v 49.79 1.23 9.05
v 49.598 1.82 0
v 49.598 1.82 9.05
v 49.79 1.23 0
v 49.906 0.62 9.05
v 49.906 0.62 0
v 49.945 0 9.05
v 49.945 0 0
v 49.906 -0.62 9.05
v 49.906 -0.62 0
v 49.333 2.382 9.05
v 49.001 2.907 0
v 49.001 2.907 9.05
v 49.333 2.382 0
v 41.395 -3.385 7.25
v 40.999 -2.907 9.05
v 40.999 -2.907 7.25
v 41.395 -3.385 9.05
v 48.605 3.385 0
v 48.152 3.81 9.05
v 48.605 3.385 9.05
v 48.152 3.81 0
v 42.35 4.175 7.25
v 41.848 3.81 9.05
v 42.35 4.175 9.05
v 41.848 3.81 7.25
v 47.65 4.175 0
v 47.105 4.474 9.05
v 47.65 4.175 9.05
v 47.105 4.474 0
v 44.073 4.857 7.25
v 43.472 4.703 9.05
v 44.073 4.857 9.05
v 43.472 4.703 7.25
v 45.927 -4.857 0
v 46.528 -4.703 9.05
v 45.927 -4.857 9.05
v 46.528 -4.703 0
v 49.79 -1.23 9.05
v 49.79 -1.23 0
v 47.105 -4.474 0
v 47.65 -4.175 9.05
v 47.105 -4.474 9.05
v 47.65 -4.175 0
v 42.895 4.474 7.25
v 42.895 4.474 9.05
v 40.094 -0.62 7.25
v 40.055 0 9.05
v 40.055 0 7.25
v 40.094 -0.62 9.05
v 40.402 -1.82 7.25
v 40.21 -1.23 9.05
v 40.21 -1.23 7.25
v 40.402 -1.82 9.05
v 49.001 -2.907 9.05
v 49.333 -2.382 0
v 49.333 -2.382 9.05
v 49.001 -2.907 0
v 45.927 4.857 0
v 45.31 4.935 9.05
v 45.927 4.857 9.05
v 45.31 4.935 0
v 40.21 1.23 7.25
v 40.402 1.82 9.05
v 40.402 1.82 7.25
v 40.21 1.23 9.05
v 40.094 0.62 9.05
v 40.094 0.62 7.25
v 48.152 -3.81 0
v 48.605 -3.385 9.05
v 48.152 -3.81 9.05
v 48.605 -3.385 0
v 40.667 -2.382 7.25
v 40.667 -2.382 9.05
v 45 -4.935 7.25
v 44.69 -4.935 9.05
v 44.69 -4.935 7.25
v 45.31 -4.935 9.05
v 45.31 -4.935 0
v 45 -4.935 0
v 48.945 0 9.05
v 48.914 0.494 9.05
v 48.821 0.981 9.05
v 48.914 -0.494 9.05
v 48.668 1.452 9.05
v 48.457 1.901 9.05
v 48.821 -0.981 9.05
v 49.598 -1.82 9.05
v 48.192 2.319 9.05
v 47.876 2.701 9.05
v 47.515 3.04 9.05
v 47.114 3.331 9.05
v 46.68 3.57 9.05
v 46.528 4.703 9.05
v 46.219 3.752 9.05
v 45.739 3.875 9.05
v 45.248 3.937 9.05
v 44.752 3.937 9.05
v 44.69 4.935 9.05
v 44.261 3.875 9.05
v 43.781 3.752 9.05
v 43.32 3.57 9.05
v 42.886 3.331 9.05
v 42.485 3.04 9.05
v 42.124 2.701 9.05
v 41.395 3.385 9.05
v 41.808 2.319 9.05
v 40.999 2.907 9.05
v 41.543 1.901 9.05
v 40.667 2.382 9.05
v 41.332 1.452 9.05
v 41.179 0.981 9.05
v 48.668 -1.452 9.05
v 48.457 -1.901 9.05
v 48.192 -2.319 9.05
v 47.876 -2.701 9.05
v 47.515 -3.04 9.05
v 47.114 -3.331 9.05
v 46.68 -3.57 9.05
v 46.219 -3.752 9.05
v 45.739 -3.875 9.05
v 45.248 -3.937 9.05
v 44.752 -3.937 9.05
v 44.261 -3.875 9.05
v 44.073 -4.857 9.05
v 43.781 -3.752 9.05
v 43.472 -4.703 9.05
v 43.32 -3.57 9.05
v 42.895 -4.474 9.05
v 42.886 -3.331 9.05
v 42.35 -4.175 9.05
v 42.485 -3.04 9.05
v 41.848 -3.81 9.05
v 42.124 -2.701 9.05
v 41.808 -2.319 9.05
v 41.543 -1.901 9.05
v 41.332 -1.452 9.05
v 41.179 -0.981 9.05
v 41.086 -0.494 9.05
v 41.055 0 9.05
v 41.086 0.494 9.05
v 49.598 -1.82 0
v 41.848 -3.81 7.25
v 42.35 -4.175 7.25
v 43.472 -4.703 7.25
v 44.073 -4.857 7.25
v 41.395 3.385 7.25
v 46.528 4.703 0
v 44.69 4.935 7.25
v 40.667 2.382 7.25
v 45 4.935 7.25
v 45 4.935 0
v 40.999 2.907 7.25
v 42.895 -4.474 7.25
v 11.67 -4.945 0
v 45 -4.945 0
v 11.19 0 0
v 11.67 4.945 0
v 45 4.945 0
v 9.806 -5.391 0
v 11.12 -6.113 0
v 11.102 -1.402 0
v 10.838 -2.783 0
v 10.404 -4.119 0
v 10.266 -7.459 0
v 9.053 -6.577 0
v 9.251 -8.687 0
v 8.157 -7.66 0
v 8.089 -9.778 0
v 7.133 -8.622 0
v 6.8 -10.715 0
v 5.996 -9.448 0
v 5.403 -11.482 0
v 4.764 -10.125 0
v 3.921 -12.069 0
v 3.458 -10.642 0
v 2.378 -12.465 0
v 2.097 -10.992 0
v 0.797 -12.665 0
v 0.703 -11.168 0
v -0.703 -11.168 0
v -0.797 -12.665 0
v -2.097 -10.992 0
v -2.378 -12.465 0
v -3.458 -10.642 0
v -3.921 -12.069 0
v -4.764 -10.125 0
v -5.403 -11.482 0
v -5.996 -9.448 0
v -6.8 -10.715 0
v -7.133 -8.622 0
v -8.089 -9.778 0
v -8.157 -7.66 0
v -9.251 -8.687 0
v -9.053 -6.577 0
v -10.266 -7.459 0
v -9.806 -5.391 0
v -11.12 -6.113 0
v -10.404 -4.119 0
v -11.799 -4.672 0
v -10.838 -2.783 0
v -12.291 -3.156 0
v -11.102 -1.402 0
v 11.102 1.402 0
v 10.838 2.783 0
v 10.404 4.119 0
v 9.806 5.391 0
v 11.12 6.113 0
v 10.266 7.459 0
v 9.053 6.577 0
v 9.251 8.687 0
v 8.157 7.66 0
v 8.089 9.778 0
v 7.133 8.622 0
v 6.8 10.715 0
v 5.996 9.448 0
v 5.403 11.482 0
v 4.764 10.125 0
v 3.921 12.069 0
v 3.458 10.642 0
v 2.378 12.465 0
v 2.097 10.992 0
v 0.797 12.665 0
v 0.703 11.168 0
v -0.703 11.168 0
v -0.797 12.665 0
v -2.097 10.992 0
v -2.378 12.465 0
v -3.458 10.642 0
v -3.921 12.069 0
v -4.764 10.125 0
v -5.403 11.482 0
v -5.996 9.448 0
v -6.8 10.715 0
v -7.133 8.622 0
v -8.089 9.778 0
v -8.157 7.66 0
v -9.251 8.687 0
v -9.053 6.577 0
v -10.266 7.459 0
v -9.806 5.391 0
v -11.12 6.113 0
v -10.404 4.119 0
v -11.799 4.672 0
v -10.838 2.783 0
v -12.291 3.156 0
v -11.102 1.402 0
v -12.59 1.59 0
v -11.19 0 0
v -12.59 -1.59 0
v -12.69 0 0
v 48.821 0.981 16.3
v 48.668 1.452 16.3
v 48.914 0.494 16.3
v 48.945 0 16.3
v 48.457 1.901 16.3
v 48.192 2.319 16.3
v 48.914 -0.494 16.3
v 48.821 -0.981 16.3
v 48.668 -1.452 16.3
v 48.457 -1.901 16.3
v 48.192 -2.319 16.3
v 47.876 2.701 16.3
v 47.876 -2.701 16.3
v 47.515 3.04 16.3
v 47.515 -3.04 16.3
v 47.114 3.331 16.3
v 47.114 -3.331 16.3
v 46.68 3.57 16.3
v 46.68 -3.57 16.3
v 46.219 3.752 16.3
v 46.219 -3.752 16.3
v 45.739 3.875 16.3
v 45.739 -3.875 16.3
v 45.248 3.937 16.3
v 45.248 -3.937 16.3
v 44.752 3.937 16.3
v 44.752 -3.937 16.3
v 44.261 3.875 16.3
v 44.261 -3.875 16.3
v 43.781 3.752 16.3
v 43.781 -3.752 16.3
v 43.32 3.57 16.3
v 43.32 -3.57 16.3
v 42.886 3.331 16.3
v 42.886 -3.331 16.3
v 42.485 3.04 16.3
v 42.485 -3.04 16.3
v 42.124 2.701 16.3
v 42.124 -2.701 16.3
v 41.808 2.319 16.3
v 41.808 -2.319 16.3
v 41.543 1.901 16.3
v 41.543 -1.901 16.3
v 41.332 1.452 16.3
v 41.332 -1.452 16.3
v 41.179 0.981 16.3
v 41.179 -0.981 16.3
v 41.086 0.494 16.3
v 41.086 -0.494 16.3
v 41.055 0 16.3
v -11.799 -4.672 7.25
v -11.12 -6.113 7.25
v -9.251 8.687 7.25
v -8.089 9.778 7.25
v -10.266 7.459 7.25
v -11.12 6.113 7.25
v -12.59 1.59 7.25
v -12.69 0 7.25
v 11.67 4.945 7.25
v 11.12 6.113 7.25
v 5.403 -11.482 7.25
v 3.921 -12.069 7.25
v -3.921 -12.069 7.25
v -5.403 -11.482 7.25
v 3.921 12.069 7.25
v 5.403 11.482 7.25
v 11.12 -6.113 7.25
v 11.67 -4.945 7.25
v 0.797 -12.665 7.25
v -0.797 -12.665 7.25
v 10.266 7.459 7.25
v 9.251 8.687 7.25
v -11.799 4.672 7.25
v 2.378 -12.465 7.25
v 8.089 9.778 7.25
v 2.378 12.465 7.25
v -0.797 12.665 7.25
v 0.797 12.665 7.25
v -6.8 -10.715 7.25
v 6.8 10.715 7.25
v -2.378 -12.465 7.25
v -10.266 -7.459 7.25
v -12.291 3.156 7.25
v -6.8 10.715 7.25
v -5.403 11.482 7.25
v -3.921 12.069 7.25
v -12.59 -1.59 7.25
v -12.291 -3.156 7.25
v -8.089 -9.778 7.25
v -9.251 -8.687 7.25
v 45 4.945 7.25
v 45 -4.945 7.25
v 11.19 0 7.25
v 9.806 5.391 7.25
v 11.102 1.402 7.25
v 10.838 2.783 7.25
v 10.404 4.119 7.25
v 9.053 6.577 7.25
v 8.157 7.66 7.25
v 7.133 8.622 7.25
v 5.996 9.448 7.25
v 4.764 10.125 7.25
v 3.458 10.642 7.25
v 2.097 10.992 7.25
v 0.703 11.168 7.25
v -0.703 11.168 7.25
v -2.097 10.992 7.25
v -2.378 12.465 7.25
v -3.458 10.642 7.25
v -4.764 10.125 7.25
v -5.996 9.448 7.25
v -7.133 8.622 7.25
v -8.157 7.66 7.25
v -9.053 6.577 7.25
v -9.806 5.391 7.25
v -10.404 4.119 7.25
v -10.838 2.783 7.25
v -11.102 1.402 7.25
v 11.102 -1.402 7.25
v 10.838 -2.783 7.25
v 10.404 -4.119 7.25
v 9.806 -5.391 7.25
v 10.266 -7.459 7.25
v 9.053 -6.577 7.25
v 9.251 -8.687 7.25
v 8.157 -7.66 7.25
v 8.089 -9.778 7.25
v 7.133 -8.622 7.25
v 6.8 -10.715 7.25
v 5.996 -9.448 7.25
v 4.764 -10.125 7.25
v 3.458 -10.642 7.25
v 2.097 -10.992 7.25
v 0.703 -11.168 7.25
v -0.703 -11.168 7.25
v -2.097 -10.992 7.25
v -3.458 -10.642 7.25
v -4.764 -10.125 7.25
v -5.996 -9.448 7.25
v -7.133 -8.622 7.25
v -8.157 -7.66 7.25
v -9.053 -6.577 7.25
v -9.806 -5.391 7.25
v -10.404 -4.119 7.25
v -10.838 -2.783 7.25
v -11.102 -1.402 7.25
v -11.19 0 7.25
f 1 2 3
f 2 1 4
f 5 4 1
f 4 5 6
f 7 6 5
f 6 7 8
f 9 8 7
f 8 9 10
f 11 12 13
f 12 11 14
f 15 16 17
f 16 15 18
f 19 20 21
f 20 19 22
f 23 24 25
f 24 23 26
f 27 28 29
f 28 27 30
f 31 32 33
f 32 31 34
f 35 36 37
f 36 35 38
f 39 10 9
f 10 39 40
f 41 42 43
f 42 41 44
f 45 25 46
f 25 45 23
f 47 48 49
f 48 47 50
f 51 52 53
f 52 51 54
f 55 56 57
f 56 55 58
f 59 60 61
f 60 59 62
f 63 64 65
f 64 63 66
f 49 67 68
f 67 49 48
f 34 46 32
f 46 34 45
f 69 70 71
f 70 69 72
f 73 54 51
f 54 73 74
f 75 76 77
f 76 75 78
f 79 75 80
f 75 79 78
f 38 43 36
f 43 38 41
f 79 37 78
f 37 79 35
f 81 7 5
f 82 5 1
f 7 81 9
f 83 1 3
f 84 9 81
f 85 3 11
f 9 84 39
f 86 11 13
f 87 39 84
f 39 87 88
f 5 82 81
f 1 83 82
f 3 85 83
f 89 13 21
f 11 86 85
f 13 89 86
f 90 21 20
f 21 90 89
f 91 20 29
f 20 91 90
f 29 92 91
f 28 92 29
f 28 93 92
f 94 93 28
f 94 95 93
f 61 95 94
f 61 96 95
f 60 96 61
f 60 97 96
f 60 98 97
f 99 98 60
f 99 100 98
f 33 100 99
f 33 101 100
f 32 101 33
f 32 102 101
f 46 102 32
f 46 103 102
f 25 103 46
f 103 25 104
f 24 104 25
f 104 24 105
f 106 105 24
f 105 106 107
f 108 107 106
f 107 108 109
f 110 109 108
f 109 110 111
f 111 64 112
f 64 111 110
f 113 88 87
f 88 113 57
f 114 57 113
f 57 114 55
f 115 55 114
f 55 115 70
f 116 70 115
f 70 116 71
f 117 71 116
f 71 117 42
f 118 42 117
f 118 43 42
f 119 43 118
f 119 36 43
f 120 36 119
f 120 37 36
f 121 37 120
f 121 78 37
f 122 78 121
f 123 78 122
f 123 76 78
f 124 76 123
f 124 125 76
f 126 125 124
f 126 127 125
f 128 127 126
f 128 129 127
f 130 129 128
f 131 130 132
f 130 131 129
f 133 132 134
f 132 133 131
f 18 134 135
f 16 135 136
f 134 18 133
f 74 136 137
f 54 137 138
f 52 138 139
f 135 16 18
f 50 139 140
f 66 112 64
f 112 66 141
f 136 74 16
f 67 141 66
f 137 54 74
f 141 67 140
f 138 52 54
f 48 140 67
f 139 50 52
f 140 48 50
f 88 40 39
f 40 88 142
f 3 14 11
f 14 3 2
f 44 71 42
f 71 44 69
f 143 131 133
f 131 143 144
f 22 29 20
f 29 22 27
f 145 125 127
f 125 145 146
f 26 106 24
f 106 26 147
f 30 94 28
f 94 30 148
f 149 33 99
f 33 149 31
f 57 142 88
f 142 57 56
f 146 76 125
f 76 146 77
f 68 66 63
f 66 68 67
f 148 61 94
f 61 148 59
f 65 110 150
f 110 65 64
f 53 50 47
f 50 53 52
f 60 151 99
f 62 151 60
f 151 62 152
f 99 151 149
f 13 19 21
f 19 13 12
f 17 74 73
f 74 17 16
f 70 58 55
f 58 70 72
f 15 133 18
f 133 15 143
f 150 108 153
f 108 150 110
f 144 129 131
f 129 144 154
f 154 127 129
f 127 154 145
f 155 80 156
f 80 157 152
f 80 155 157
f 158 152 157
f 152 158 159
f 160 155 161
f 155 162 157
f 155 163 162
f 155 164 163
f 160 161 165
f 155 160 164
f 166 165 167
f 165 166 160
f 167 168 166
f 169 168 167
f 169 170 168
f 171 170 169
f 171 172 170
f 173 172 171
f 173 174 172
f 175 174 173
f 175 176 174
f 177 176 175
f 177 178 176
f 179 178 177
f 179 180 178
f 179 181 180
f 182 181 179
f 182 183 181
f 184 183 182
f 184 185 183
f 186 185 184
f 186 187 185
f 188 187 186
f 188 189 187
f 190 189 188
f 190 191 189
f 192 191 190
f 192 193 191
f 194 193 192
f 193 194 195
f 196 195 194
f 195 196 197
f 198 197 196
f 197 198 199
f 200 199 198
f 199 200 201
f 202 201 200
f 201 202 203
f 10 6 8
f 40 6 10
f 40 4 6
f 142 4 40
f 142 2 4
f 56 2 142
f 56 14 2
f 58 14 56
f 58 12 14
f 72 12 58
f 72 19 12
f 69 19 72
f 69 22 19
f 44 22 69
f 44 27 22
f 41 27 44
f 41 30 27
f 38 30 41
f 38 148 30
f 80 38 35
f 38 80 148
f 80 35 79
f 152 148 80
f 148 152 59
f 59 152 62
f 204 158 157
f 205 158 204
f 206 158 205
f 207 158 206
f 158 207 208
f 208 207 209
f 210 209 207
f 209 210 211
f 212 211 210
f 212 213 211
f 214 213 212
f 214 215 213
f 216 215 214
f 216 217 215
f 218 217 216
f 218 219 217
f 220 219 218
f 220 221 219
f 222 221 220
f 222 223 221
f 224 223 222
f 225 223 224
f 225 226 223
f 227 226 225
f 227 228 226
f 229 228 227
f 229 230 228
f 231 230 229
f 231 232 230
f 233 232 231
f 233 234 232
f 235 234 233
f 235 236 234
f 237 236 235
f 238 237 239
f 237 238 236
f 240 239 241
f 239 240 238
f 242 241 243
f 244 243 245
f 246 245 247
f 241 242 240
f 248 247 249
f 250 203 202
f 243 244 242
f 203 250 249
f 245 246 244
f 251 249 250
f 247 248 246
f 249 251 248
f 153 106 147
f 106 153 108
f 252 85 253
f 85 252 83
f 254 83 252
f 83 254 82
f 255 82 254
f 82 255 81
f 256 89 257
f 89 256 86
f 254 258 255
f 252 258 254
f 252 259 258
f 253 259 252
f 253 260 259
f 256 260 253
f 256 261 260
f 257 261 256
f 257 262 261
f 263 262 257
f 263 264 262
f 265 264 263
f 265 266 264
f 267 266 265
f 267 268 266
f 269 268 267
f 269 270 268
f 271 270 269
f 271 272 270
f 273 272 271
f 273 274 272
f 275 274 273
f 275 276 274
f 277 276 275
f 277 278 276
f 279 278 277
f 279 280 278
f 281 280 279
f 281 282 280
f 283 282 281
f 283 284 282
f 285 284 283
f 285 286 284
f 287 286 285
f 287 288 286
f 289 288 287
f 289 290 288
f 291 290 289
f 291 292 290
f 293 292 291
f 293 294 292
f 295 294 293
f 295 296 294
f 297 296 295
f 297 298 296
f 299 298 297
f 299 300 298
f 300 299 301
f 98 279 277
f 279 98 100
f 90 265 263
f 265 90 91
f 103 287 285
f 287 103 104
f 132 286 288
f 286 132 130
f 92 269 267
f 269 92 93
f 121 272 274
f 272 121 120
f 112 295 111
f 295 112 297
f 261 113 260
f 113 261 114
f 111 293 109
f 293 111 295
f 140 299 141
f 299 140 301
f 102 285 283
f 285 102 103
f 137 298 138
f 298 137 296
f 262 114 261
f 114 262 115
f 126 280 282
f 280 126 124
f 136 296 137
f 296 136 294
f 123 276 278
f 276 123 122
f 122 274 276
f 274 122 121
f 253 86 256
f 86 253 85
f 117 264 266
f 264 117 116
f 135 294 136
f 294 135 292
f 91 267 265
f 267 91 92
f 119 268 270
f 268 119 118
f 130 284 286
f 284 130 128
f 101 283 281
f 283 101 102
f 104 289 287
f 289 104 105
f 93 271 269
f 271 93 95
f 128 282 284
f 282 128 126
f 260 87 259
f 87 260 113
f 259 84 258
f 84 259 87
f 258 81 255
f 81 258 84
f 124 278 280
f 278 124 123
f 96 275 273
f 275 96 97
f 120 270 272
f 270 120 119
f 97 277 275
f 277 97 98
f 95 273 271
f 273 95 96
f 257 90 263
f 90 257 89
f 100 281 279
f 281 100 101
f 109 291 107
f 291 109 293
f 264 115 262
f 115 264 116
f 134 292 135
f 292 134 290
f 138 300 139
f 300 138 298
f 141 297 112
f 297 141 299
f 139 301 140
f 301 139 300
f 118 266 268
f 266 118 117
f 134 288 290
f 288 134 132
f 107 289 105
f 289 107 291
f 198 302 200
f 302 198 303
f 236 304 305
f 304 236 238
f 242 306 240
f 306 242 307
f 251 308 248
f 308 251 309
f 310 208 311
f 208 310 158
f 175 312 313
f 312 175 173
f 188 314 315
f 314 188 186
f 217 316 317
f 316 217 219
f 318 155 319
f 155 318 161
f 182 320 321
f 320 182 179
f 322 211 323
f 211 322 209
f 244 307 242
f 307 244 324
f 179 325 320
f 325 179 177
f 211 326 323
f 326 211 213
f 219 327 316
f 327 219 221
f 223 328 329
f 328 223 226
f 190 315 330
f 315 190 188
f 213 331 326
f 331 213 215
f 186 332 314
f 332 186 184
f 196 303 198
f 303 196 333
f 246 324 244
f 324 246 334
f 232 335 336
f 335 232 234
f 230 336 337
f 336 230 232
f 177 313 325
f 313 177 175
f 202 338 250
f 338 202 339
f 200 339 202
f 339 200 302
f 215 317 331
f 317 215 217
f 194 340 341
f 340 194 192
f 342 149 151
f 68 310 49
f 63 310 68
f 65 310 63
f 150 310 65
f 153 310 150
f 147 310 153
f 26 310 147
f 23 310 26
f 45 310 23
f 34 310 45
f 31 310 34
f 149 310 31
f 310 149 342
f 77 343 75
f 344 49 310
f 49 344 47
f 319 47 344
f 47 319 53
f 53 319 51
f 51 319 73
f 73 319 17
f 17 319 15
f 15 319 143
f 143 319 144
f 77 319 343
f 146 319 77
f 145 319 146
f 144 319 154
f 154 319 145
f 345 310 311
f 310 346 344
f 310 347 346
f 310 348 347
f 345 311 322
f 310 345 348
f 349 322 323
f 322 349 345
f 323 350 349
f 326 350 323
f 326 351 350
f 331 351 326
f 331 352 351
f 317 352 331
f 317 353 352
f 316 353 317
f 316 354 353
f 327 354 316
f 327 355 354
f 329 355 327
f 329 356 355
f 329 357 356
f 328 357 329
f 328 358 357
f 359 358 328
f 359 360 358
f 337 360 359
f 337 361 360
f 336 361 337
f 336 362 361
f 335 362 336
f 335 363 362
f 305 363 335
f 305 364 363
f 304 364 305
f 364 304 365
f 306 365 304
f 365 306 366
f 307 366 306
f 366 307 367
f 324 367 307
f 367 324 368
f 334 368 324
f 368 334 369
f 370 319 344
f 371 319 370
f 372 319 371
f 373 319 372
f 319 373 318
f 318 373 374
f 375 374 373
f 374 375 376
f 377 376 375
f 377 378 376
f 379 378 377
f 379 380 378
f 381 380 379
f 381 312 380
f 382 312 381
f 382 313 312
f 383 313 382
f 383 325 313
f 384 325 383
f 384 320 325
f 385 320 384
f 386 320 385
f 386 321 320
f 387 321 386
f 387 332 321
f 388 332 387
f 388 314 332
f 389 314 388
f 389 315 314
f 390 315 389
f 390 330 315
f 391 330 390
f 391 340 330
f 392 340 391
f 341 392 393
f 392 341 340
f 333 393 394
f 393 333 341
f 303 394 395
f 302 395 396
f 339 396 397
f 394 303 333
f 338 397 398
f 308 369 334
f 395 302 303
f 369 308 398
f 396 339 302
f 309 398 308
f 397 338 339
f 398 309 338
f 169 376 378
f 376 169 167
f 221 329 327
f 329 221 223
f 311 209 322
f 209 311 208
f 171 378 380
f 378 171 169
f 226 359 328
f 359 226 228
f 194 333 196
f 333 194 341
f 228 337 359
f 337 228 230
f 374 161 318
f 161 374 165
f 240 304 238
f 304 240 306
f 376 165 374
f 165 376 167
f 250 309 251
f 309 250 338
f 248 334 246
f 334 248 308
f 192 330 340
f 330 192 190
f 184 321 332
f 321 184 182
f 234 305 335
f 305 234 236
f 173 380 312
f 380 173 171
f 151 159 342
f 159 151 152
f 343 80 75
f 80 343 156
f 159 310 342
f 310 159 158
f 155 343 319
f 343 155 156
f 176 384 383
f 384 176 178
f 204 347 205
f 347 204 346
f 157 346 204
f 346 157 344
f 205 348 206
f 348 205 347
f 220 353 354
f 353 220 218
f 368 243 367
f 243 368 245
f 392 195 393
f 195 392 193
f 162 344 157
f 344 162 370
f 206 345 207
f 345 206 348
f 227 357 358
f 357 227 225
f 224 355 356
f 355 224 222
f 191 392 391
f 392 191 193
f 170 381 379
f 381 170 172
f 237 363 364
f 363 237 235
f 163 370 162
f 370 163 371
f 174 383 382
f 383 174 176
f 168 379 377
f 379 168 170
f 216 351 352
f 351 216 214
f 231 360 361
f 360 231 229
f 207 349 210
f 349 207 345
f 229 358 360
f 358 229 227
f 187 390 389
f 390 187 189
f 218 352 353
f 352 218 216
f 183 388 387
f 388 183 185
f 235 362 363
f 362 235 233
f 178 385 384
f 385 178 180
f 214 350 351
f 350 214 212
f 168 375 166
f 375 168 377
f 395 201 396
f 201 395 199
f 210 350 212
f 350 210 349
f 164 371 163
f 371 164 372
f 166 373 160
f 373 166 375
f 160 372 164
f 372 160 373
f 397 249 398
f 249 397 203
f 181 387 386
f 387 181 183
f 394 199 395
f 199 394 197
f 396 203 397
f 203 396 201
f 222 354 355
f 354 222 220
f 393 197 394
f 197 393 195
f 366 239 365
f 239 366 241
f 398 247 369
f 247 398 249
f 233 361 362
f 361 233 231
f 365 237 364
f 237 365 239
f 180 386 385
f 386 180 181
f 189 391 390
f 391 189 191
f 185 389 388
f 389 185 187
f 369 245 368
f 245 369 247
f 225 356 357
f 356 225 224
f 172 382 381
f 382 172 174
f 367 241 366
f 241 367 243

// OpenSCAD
bearing_height = 7.25;
bearing_outer_diameter = 22.38;
bearing_inner_diameter = 7.89;
link_length = 45;
$fn = 50;

module press_fit_link(
  bearing_height,
  bearing_outer_diameter,
  bearing_inner_diameter,
  link_length,
  outer_diameter_margin=3,
  inner_diameter_margin=2,
  link_layer_margin=1.8,
) {
  link_width = bearing_inner_diameter + inner_diameter_margin;

  module negative() {
    translate([0, 0, -1])
    cylinder(h=bearing_height + 2, d=bearing_outer_diameter);
  }

  module positive() {
    cylinder(h=bearing_height, d=bearing_outer_diameter + outer_diameter_margin);

    translate([0, -link_width / 2, 0])
    cube([link_length, link_width, bearing_height]);

    translate([link_length, 0, 0]) {
      cylinder(h=bearing_height + link_layer_margin, d=link_width);
      cylinder(h=bearing_height * 2 + link_layer_margin, d=bearing_inner_diameter);
    }
  }

  difference() {
    positive();
    negative();
  }
}

press_fit_link(
  bearing_height=bearing_height,
  bearing_outer_diameter=bearing_outer_diameter,
  bearing_inner_diameter=bearing_inner_diameter,
  link_length=link_length
);
